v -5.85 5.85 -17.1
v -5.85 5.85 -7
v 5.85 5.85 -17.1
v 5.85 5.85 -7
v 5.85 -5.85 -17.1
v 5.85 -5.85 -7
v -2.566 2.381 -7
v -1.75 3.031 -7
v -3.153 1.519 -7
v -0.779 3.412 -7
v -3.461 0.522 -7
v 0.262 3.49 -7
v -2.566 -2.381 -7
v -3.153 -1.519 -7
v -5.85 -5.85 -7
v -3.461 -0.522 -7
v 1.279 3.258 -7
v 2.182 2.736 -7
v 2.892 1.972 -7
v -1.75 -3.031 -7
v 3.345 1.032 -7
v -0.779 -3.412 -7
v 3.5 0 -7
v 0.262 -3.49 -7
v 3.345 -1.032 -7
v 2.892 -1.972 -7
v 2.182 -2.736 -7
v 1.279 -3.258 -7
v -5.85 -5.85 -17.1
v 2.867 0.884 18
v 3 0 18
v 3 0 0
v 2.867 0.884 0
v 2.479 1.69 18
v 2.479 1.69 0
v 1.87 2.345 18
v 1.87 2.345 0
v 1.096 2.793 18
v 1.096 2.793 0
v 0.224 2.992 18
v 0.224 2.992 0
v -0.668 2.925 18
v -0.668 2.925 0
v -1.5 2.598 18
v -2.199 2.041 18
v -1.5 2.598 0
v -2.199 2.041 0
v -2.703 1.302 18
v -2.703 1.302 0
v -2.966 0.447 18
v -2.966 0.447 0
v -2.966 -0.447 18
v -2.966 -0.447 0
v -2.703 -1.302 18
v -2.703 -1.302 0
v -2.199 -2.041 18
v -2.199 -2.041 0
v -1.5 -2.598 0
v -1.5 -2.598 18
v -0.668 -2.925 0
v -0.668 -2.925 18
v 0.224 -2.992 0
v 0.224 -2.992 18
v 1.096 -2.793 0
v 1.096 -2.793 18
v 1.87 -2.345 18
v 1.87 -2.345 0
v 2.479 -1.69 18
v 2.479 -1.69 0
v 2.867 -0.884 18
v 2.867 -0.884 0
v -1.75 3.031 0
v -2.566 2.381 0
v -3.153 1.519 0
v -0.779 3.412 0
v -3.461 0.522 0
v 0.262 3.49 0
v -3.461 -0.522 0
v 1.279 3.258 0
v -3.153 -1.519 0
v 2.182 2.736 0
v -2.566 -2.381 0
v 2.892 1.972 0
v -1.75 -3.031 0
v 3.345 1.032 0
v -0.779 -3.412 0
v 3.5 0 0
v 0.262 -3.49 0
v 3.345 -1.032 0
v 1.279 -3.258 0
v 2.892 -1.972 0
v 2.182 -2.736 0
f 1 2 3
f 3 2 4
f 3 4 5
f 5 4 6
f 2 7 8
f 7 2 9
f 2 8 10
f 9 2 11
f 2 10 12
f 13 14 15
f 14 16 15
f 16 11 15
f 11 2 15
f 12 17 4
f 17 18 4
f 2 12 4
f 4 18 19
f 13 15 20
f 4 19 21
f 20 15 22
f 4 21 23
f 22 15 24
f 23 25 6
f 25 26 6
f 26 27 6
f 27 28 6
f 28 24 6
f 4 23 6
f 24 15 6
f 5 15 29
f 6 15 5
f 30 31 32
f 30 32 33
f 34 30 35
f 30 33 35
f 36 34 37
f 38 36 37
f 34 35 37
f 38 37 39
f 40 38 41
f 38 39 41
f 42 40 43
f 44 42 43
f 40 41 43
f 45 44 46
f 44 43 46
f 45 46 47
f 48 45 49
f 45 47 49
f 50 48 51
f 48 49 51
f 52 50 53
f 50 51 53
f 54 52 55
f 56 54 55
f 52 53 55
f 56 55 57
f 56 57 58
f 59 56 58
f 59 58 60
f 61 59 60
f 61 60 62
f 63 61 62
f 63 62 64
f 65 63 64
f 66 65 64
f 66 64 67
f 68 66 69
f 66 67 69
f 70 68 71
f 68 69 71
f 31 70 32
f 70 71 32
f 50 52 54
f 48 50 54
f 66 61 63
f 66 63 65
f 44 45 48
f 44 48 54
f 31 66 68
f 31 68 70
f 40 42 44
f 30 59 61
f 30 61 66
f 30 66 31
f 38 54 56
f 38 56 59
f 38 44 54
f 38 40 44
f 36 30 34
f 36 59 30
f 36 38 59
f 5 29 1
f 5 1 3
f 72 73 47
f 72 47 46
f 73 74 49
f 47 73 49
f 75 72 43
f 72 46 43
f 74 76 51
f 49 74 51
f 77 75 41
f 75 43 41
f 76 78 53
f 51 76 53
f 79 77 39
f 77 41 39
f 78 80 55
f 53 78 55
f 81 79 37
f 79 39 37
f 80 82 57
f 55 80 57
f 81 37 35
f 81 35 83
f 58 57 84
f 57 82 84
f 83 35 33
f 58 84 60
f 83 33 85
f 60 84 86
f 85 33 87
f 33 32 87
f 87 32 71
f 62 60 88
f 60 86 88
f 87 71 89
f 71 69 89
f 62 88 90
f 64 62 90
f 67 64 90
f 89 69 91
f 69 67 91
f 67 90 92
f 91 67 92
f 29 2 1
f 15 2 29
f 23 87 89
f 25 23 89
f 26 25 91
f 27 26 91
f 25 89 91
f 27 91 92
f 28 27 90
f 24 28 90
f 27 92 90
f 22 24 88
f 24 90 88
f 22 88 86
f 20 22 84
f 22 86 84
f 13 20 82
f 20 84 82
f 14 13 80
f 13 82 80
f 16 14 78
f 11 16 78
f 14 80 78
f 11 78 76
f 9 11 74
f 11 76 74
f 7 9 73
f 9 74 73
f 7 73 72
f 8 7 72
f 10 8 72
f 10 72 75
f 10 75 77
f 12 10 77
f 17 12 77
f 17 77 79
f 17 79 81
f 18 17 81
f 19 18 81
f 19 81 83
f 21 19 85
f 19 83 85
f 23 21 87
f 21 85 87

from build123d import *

# Parameters (mm, degrees)
F0_R     = 3
F1_DEPTH = 18
F2_R     = 3.5
F2_R_2   = 3
F3_DEPTH = 7
F4_W     = 11.7
F4_H     = 11.7
F4_R     = 3.5
F5_DEPTH = 10.1


with BuildPart() as f1:
    # F0 (on Top) → F1 (new body)
    with BuildSketch(Plane.XY):
        Circle(F0_R)
    extrude(amount=F1_DEPTH)

    # F2 (on face) → F3 (join)
    with BuildSketch(Plane(origin=(0, 0, 0), x_dir=(1, 0, 0), z_dir=(0, 0, -1))):
        Circle(F2_R)
        Circle(F2_R_2, mode=Mode.SUBTRACT)
        Circle(F2_R_2)
    extrude(amount=F3_DEPTH)

    # F4 (on face) → F5 (join)
    with BuildSketch(Plane(origin=(0, 0, -7), x_dir=(1, 0, 0), z_dir=(0, 0, -1))):
        Rectangle(F4_W, F4_H)
        Circle(F4_R, mode=Mode.SUBTRACT)
        Circle(F4_R)
    extrude(amount=F5_DEPTH)


solid = f1.part
